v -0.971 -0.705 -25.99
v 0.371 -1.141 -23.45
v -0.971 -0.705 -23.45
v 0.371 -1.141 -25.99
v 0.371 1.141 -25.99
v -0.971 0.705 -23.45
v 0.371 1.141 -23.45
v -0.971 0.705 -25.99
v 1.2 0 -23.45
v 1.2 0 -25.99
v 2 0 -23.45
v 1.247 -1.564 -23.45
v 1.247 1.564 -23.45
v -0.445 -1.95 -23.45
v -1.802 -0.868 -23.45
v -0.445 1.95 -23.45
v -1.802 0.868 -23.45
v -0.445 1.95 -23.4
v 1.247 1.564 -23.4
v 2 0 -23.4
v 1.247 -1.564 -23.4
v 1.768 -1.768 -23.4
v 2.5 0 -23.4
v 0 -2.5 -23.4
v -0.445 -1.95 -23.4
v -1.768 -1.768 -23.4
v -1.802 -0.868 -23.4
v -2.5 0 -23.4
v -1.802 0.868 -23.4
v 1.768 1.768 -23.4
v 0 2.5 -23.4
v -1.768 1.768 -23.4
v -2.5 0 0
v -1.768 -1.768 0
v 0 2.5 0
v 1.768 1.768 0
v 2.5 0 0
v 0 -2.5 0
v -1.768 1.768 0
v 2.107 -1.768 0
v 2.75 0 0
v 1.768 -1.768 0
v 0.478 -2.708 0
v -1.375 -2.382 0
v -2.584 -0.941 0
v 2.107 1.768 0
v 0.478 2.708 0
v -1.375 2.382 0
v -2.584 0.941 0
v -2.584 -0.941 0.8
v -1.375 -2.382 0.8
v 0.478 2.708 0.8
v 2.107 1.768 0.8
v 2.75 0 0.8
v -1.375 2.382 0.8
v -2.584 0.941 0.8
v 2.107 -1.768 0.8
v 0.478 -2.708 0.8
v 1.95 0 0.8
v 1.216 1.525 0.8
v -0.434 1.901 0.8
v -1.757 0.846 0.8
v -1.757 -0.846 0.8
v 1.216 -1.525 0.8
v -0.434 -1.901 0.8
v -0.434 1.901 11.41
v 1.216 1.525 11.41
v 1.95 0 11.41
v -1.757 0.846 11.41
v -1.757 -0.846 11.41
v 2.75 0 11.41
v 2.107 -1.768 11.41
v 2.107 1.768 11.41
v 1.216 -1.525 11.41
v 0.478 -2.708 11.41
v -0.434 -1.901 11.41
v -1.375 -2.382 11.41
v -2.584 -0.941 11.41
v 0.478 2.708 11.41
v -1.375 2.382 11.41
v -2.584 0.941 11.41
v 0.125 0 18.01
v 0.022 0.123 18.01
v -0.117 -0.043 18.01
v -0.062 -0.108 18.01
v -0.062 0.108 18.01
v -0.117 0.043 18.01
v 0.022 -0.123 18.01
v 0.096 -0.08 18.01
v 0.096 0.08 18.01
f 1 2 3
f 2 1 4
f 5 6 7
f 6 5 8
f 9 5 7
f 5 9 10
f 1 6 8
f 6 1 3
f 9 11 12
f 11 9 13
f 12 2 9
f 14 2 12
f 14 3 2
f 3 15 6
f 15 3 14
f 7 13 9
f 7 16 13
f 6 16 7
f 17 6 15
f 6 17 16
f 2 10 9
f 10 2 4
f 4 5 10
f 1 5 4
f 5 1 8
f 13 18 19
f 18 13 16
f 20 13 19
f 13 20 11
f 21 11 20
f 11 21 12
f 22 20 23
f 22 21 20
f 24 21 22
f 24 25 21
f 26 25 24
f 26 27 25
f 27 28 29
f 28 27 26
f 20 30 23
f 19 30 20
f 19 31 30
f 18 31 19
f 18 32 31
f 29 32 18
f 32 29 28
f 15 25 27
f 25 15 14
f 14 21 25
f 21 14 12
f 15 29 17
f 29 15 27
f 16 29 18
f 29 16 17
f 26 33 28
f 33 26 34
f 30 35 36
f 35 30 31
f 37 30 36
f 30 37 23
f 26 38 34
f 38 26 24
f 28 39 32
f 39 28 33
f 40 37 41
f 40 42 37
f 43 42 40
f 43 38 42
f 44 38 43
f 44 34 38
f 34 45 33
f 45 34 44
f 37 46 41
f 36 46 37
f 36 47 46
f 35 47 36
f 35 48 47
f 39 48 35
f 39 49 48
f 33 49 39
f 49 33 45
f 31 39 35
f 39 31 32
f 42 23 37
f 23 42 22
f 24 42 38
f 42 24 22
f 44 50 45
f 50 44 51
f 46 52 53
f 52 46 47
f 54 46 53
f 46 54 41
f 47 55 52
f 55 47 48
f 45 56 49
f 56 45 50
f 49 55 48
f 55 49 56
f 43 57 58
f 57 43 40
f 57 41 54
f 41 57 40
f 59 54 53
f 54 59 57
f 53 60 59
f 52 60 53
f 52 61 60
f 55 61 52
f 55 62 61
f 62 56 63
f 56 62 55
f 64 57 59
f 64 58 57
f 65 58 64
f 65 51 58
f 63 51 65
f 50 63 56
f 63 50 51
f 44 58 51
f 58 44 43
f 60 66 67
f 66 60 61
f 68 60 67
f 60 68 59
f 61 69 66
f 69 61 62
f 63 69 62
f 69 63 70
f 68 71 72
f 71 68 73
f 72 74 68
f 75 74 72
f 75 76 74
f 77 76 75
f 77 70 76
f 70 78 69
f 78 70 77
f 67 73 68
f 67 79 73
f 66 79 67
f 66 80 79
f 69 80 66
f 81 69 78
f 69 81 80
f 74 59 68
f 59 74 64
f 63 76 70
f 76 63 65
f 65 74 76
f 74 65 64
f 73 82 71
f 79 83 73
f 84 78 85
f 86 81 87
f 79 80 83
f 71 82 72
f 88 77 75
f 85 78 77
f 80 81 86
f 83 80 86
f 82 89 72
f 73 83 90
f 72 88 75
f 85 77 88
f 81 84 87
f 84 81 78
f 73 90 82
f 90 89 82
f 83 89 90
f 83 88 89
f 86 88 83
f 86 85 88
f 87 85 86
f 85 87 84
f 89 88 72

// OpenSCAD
/* [Options] */
body_lip_diameter = 5.5;
body_diameter = 5;
lower_shaft_diameter = 2.4;
head_diameter = 5.5;
head_length = 6.6;
upper_shaft_diameter = 3.9;
total_length = 44;
body_lip_height = 0.8;
body_length = 23.4;
compression = 0;
retaining_disk_location_from_bottom = 2.54;
retaining_disk_height = 0.05;
retaining_disk_diameter = 4;
head_tip_diameter = 0.25;

module make_GP_xL(body_lip_diameter = body_lip_diameter,
body_diameter = body_diameter,
lower_shaft_diameter = lower_shaft_diameter,
head_diameter = head_diameter,
head_length = head_length,
upper_shaft_diameter = upper_shaft_diameter,
total_length = total_length,
body_lip_height = body_lip_height,
body_length = body_length,
compression = compression,
retaining_disk_location_from_bottom = retaining_disk_location_from_bottom,
retaining_disk_height = retaining_disk_height,
retaining_disk_diameter = retaining_disk_diameter,
head_tip_diameter = head_tip_diameter) {
    /*
    Bottom Shaft
    Retaining Ring
    Continuing Bottom Shaft
    Body
    Body Lip
    Upper Shaft
    Cone
    Compression
    */
    bottom_shaft_length = compression;
    upper_shaft_length = total_length-(retaining_disk_location_from_bottom+retaining_disk_height+bottom_shaft_length+body_length+body_lip_height+head_length);
    
    alignment_position = retaining_disk_location_from_bottom+retaining_disk_height+bottom_shaft_length+body_length;
    translate([0, 0, -alignment_position]) {
    translate([0,0,retaining_disk_location_from_bottom/2])cylinder(d=lower_shaft_diameter, h=retaining_disk_location_from_bottom, center=true);

    translate([0,0,retaining_disk_location_from_bottom])cylinder(d=retaining_disk_diameter, h=retaining_disk_height, center=false);

    translate([0,0,retaining_disk_location_from_bottom+retaining_disk_height])cylinder(d=lower_shaft_diameter, h=bottom_shaft_length);
    
    let(z=retaining_disk_location_from_bottom+retaining_disk_height+bottom_shaft_length) {
        translate([0,0,z])cylinder(d=body_diameter, h=body_length);
    };
    
    
    let(z=retaining_disk_location_from_bottom+retaining_disk_height+bottom_shaft_length+body_length) {
        translate([0,0,z])cylinder(d=body_lip_diameter, h=body_lip_height);
    };
    
    let(z=retaining_disk_location_from_bottom+retaining_disk_height+bottom_shaft_length+body_length+body_lip_height) {
        translate([0,0,z])cylinder(d=upper_shaft_diameter, h=upper_shaft_length);
    };
    
    let(z=retaining_disk_location_from_bottom+retaining_disk_height+bottom_shaft_length+body_length+body_lip_height+upper_shaft_length) {
        translate([0,0,z])cylinder(d1=head_diameter, d2=head_tip_diameter, h=head_length);
    };
};
}


make_GP_xL();
